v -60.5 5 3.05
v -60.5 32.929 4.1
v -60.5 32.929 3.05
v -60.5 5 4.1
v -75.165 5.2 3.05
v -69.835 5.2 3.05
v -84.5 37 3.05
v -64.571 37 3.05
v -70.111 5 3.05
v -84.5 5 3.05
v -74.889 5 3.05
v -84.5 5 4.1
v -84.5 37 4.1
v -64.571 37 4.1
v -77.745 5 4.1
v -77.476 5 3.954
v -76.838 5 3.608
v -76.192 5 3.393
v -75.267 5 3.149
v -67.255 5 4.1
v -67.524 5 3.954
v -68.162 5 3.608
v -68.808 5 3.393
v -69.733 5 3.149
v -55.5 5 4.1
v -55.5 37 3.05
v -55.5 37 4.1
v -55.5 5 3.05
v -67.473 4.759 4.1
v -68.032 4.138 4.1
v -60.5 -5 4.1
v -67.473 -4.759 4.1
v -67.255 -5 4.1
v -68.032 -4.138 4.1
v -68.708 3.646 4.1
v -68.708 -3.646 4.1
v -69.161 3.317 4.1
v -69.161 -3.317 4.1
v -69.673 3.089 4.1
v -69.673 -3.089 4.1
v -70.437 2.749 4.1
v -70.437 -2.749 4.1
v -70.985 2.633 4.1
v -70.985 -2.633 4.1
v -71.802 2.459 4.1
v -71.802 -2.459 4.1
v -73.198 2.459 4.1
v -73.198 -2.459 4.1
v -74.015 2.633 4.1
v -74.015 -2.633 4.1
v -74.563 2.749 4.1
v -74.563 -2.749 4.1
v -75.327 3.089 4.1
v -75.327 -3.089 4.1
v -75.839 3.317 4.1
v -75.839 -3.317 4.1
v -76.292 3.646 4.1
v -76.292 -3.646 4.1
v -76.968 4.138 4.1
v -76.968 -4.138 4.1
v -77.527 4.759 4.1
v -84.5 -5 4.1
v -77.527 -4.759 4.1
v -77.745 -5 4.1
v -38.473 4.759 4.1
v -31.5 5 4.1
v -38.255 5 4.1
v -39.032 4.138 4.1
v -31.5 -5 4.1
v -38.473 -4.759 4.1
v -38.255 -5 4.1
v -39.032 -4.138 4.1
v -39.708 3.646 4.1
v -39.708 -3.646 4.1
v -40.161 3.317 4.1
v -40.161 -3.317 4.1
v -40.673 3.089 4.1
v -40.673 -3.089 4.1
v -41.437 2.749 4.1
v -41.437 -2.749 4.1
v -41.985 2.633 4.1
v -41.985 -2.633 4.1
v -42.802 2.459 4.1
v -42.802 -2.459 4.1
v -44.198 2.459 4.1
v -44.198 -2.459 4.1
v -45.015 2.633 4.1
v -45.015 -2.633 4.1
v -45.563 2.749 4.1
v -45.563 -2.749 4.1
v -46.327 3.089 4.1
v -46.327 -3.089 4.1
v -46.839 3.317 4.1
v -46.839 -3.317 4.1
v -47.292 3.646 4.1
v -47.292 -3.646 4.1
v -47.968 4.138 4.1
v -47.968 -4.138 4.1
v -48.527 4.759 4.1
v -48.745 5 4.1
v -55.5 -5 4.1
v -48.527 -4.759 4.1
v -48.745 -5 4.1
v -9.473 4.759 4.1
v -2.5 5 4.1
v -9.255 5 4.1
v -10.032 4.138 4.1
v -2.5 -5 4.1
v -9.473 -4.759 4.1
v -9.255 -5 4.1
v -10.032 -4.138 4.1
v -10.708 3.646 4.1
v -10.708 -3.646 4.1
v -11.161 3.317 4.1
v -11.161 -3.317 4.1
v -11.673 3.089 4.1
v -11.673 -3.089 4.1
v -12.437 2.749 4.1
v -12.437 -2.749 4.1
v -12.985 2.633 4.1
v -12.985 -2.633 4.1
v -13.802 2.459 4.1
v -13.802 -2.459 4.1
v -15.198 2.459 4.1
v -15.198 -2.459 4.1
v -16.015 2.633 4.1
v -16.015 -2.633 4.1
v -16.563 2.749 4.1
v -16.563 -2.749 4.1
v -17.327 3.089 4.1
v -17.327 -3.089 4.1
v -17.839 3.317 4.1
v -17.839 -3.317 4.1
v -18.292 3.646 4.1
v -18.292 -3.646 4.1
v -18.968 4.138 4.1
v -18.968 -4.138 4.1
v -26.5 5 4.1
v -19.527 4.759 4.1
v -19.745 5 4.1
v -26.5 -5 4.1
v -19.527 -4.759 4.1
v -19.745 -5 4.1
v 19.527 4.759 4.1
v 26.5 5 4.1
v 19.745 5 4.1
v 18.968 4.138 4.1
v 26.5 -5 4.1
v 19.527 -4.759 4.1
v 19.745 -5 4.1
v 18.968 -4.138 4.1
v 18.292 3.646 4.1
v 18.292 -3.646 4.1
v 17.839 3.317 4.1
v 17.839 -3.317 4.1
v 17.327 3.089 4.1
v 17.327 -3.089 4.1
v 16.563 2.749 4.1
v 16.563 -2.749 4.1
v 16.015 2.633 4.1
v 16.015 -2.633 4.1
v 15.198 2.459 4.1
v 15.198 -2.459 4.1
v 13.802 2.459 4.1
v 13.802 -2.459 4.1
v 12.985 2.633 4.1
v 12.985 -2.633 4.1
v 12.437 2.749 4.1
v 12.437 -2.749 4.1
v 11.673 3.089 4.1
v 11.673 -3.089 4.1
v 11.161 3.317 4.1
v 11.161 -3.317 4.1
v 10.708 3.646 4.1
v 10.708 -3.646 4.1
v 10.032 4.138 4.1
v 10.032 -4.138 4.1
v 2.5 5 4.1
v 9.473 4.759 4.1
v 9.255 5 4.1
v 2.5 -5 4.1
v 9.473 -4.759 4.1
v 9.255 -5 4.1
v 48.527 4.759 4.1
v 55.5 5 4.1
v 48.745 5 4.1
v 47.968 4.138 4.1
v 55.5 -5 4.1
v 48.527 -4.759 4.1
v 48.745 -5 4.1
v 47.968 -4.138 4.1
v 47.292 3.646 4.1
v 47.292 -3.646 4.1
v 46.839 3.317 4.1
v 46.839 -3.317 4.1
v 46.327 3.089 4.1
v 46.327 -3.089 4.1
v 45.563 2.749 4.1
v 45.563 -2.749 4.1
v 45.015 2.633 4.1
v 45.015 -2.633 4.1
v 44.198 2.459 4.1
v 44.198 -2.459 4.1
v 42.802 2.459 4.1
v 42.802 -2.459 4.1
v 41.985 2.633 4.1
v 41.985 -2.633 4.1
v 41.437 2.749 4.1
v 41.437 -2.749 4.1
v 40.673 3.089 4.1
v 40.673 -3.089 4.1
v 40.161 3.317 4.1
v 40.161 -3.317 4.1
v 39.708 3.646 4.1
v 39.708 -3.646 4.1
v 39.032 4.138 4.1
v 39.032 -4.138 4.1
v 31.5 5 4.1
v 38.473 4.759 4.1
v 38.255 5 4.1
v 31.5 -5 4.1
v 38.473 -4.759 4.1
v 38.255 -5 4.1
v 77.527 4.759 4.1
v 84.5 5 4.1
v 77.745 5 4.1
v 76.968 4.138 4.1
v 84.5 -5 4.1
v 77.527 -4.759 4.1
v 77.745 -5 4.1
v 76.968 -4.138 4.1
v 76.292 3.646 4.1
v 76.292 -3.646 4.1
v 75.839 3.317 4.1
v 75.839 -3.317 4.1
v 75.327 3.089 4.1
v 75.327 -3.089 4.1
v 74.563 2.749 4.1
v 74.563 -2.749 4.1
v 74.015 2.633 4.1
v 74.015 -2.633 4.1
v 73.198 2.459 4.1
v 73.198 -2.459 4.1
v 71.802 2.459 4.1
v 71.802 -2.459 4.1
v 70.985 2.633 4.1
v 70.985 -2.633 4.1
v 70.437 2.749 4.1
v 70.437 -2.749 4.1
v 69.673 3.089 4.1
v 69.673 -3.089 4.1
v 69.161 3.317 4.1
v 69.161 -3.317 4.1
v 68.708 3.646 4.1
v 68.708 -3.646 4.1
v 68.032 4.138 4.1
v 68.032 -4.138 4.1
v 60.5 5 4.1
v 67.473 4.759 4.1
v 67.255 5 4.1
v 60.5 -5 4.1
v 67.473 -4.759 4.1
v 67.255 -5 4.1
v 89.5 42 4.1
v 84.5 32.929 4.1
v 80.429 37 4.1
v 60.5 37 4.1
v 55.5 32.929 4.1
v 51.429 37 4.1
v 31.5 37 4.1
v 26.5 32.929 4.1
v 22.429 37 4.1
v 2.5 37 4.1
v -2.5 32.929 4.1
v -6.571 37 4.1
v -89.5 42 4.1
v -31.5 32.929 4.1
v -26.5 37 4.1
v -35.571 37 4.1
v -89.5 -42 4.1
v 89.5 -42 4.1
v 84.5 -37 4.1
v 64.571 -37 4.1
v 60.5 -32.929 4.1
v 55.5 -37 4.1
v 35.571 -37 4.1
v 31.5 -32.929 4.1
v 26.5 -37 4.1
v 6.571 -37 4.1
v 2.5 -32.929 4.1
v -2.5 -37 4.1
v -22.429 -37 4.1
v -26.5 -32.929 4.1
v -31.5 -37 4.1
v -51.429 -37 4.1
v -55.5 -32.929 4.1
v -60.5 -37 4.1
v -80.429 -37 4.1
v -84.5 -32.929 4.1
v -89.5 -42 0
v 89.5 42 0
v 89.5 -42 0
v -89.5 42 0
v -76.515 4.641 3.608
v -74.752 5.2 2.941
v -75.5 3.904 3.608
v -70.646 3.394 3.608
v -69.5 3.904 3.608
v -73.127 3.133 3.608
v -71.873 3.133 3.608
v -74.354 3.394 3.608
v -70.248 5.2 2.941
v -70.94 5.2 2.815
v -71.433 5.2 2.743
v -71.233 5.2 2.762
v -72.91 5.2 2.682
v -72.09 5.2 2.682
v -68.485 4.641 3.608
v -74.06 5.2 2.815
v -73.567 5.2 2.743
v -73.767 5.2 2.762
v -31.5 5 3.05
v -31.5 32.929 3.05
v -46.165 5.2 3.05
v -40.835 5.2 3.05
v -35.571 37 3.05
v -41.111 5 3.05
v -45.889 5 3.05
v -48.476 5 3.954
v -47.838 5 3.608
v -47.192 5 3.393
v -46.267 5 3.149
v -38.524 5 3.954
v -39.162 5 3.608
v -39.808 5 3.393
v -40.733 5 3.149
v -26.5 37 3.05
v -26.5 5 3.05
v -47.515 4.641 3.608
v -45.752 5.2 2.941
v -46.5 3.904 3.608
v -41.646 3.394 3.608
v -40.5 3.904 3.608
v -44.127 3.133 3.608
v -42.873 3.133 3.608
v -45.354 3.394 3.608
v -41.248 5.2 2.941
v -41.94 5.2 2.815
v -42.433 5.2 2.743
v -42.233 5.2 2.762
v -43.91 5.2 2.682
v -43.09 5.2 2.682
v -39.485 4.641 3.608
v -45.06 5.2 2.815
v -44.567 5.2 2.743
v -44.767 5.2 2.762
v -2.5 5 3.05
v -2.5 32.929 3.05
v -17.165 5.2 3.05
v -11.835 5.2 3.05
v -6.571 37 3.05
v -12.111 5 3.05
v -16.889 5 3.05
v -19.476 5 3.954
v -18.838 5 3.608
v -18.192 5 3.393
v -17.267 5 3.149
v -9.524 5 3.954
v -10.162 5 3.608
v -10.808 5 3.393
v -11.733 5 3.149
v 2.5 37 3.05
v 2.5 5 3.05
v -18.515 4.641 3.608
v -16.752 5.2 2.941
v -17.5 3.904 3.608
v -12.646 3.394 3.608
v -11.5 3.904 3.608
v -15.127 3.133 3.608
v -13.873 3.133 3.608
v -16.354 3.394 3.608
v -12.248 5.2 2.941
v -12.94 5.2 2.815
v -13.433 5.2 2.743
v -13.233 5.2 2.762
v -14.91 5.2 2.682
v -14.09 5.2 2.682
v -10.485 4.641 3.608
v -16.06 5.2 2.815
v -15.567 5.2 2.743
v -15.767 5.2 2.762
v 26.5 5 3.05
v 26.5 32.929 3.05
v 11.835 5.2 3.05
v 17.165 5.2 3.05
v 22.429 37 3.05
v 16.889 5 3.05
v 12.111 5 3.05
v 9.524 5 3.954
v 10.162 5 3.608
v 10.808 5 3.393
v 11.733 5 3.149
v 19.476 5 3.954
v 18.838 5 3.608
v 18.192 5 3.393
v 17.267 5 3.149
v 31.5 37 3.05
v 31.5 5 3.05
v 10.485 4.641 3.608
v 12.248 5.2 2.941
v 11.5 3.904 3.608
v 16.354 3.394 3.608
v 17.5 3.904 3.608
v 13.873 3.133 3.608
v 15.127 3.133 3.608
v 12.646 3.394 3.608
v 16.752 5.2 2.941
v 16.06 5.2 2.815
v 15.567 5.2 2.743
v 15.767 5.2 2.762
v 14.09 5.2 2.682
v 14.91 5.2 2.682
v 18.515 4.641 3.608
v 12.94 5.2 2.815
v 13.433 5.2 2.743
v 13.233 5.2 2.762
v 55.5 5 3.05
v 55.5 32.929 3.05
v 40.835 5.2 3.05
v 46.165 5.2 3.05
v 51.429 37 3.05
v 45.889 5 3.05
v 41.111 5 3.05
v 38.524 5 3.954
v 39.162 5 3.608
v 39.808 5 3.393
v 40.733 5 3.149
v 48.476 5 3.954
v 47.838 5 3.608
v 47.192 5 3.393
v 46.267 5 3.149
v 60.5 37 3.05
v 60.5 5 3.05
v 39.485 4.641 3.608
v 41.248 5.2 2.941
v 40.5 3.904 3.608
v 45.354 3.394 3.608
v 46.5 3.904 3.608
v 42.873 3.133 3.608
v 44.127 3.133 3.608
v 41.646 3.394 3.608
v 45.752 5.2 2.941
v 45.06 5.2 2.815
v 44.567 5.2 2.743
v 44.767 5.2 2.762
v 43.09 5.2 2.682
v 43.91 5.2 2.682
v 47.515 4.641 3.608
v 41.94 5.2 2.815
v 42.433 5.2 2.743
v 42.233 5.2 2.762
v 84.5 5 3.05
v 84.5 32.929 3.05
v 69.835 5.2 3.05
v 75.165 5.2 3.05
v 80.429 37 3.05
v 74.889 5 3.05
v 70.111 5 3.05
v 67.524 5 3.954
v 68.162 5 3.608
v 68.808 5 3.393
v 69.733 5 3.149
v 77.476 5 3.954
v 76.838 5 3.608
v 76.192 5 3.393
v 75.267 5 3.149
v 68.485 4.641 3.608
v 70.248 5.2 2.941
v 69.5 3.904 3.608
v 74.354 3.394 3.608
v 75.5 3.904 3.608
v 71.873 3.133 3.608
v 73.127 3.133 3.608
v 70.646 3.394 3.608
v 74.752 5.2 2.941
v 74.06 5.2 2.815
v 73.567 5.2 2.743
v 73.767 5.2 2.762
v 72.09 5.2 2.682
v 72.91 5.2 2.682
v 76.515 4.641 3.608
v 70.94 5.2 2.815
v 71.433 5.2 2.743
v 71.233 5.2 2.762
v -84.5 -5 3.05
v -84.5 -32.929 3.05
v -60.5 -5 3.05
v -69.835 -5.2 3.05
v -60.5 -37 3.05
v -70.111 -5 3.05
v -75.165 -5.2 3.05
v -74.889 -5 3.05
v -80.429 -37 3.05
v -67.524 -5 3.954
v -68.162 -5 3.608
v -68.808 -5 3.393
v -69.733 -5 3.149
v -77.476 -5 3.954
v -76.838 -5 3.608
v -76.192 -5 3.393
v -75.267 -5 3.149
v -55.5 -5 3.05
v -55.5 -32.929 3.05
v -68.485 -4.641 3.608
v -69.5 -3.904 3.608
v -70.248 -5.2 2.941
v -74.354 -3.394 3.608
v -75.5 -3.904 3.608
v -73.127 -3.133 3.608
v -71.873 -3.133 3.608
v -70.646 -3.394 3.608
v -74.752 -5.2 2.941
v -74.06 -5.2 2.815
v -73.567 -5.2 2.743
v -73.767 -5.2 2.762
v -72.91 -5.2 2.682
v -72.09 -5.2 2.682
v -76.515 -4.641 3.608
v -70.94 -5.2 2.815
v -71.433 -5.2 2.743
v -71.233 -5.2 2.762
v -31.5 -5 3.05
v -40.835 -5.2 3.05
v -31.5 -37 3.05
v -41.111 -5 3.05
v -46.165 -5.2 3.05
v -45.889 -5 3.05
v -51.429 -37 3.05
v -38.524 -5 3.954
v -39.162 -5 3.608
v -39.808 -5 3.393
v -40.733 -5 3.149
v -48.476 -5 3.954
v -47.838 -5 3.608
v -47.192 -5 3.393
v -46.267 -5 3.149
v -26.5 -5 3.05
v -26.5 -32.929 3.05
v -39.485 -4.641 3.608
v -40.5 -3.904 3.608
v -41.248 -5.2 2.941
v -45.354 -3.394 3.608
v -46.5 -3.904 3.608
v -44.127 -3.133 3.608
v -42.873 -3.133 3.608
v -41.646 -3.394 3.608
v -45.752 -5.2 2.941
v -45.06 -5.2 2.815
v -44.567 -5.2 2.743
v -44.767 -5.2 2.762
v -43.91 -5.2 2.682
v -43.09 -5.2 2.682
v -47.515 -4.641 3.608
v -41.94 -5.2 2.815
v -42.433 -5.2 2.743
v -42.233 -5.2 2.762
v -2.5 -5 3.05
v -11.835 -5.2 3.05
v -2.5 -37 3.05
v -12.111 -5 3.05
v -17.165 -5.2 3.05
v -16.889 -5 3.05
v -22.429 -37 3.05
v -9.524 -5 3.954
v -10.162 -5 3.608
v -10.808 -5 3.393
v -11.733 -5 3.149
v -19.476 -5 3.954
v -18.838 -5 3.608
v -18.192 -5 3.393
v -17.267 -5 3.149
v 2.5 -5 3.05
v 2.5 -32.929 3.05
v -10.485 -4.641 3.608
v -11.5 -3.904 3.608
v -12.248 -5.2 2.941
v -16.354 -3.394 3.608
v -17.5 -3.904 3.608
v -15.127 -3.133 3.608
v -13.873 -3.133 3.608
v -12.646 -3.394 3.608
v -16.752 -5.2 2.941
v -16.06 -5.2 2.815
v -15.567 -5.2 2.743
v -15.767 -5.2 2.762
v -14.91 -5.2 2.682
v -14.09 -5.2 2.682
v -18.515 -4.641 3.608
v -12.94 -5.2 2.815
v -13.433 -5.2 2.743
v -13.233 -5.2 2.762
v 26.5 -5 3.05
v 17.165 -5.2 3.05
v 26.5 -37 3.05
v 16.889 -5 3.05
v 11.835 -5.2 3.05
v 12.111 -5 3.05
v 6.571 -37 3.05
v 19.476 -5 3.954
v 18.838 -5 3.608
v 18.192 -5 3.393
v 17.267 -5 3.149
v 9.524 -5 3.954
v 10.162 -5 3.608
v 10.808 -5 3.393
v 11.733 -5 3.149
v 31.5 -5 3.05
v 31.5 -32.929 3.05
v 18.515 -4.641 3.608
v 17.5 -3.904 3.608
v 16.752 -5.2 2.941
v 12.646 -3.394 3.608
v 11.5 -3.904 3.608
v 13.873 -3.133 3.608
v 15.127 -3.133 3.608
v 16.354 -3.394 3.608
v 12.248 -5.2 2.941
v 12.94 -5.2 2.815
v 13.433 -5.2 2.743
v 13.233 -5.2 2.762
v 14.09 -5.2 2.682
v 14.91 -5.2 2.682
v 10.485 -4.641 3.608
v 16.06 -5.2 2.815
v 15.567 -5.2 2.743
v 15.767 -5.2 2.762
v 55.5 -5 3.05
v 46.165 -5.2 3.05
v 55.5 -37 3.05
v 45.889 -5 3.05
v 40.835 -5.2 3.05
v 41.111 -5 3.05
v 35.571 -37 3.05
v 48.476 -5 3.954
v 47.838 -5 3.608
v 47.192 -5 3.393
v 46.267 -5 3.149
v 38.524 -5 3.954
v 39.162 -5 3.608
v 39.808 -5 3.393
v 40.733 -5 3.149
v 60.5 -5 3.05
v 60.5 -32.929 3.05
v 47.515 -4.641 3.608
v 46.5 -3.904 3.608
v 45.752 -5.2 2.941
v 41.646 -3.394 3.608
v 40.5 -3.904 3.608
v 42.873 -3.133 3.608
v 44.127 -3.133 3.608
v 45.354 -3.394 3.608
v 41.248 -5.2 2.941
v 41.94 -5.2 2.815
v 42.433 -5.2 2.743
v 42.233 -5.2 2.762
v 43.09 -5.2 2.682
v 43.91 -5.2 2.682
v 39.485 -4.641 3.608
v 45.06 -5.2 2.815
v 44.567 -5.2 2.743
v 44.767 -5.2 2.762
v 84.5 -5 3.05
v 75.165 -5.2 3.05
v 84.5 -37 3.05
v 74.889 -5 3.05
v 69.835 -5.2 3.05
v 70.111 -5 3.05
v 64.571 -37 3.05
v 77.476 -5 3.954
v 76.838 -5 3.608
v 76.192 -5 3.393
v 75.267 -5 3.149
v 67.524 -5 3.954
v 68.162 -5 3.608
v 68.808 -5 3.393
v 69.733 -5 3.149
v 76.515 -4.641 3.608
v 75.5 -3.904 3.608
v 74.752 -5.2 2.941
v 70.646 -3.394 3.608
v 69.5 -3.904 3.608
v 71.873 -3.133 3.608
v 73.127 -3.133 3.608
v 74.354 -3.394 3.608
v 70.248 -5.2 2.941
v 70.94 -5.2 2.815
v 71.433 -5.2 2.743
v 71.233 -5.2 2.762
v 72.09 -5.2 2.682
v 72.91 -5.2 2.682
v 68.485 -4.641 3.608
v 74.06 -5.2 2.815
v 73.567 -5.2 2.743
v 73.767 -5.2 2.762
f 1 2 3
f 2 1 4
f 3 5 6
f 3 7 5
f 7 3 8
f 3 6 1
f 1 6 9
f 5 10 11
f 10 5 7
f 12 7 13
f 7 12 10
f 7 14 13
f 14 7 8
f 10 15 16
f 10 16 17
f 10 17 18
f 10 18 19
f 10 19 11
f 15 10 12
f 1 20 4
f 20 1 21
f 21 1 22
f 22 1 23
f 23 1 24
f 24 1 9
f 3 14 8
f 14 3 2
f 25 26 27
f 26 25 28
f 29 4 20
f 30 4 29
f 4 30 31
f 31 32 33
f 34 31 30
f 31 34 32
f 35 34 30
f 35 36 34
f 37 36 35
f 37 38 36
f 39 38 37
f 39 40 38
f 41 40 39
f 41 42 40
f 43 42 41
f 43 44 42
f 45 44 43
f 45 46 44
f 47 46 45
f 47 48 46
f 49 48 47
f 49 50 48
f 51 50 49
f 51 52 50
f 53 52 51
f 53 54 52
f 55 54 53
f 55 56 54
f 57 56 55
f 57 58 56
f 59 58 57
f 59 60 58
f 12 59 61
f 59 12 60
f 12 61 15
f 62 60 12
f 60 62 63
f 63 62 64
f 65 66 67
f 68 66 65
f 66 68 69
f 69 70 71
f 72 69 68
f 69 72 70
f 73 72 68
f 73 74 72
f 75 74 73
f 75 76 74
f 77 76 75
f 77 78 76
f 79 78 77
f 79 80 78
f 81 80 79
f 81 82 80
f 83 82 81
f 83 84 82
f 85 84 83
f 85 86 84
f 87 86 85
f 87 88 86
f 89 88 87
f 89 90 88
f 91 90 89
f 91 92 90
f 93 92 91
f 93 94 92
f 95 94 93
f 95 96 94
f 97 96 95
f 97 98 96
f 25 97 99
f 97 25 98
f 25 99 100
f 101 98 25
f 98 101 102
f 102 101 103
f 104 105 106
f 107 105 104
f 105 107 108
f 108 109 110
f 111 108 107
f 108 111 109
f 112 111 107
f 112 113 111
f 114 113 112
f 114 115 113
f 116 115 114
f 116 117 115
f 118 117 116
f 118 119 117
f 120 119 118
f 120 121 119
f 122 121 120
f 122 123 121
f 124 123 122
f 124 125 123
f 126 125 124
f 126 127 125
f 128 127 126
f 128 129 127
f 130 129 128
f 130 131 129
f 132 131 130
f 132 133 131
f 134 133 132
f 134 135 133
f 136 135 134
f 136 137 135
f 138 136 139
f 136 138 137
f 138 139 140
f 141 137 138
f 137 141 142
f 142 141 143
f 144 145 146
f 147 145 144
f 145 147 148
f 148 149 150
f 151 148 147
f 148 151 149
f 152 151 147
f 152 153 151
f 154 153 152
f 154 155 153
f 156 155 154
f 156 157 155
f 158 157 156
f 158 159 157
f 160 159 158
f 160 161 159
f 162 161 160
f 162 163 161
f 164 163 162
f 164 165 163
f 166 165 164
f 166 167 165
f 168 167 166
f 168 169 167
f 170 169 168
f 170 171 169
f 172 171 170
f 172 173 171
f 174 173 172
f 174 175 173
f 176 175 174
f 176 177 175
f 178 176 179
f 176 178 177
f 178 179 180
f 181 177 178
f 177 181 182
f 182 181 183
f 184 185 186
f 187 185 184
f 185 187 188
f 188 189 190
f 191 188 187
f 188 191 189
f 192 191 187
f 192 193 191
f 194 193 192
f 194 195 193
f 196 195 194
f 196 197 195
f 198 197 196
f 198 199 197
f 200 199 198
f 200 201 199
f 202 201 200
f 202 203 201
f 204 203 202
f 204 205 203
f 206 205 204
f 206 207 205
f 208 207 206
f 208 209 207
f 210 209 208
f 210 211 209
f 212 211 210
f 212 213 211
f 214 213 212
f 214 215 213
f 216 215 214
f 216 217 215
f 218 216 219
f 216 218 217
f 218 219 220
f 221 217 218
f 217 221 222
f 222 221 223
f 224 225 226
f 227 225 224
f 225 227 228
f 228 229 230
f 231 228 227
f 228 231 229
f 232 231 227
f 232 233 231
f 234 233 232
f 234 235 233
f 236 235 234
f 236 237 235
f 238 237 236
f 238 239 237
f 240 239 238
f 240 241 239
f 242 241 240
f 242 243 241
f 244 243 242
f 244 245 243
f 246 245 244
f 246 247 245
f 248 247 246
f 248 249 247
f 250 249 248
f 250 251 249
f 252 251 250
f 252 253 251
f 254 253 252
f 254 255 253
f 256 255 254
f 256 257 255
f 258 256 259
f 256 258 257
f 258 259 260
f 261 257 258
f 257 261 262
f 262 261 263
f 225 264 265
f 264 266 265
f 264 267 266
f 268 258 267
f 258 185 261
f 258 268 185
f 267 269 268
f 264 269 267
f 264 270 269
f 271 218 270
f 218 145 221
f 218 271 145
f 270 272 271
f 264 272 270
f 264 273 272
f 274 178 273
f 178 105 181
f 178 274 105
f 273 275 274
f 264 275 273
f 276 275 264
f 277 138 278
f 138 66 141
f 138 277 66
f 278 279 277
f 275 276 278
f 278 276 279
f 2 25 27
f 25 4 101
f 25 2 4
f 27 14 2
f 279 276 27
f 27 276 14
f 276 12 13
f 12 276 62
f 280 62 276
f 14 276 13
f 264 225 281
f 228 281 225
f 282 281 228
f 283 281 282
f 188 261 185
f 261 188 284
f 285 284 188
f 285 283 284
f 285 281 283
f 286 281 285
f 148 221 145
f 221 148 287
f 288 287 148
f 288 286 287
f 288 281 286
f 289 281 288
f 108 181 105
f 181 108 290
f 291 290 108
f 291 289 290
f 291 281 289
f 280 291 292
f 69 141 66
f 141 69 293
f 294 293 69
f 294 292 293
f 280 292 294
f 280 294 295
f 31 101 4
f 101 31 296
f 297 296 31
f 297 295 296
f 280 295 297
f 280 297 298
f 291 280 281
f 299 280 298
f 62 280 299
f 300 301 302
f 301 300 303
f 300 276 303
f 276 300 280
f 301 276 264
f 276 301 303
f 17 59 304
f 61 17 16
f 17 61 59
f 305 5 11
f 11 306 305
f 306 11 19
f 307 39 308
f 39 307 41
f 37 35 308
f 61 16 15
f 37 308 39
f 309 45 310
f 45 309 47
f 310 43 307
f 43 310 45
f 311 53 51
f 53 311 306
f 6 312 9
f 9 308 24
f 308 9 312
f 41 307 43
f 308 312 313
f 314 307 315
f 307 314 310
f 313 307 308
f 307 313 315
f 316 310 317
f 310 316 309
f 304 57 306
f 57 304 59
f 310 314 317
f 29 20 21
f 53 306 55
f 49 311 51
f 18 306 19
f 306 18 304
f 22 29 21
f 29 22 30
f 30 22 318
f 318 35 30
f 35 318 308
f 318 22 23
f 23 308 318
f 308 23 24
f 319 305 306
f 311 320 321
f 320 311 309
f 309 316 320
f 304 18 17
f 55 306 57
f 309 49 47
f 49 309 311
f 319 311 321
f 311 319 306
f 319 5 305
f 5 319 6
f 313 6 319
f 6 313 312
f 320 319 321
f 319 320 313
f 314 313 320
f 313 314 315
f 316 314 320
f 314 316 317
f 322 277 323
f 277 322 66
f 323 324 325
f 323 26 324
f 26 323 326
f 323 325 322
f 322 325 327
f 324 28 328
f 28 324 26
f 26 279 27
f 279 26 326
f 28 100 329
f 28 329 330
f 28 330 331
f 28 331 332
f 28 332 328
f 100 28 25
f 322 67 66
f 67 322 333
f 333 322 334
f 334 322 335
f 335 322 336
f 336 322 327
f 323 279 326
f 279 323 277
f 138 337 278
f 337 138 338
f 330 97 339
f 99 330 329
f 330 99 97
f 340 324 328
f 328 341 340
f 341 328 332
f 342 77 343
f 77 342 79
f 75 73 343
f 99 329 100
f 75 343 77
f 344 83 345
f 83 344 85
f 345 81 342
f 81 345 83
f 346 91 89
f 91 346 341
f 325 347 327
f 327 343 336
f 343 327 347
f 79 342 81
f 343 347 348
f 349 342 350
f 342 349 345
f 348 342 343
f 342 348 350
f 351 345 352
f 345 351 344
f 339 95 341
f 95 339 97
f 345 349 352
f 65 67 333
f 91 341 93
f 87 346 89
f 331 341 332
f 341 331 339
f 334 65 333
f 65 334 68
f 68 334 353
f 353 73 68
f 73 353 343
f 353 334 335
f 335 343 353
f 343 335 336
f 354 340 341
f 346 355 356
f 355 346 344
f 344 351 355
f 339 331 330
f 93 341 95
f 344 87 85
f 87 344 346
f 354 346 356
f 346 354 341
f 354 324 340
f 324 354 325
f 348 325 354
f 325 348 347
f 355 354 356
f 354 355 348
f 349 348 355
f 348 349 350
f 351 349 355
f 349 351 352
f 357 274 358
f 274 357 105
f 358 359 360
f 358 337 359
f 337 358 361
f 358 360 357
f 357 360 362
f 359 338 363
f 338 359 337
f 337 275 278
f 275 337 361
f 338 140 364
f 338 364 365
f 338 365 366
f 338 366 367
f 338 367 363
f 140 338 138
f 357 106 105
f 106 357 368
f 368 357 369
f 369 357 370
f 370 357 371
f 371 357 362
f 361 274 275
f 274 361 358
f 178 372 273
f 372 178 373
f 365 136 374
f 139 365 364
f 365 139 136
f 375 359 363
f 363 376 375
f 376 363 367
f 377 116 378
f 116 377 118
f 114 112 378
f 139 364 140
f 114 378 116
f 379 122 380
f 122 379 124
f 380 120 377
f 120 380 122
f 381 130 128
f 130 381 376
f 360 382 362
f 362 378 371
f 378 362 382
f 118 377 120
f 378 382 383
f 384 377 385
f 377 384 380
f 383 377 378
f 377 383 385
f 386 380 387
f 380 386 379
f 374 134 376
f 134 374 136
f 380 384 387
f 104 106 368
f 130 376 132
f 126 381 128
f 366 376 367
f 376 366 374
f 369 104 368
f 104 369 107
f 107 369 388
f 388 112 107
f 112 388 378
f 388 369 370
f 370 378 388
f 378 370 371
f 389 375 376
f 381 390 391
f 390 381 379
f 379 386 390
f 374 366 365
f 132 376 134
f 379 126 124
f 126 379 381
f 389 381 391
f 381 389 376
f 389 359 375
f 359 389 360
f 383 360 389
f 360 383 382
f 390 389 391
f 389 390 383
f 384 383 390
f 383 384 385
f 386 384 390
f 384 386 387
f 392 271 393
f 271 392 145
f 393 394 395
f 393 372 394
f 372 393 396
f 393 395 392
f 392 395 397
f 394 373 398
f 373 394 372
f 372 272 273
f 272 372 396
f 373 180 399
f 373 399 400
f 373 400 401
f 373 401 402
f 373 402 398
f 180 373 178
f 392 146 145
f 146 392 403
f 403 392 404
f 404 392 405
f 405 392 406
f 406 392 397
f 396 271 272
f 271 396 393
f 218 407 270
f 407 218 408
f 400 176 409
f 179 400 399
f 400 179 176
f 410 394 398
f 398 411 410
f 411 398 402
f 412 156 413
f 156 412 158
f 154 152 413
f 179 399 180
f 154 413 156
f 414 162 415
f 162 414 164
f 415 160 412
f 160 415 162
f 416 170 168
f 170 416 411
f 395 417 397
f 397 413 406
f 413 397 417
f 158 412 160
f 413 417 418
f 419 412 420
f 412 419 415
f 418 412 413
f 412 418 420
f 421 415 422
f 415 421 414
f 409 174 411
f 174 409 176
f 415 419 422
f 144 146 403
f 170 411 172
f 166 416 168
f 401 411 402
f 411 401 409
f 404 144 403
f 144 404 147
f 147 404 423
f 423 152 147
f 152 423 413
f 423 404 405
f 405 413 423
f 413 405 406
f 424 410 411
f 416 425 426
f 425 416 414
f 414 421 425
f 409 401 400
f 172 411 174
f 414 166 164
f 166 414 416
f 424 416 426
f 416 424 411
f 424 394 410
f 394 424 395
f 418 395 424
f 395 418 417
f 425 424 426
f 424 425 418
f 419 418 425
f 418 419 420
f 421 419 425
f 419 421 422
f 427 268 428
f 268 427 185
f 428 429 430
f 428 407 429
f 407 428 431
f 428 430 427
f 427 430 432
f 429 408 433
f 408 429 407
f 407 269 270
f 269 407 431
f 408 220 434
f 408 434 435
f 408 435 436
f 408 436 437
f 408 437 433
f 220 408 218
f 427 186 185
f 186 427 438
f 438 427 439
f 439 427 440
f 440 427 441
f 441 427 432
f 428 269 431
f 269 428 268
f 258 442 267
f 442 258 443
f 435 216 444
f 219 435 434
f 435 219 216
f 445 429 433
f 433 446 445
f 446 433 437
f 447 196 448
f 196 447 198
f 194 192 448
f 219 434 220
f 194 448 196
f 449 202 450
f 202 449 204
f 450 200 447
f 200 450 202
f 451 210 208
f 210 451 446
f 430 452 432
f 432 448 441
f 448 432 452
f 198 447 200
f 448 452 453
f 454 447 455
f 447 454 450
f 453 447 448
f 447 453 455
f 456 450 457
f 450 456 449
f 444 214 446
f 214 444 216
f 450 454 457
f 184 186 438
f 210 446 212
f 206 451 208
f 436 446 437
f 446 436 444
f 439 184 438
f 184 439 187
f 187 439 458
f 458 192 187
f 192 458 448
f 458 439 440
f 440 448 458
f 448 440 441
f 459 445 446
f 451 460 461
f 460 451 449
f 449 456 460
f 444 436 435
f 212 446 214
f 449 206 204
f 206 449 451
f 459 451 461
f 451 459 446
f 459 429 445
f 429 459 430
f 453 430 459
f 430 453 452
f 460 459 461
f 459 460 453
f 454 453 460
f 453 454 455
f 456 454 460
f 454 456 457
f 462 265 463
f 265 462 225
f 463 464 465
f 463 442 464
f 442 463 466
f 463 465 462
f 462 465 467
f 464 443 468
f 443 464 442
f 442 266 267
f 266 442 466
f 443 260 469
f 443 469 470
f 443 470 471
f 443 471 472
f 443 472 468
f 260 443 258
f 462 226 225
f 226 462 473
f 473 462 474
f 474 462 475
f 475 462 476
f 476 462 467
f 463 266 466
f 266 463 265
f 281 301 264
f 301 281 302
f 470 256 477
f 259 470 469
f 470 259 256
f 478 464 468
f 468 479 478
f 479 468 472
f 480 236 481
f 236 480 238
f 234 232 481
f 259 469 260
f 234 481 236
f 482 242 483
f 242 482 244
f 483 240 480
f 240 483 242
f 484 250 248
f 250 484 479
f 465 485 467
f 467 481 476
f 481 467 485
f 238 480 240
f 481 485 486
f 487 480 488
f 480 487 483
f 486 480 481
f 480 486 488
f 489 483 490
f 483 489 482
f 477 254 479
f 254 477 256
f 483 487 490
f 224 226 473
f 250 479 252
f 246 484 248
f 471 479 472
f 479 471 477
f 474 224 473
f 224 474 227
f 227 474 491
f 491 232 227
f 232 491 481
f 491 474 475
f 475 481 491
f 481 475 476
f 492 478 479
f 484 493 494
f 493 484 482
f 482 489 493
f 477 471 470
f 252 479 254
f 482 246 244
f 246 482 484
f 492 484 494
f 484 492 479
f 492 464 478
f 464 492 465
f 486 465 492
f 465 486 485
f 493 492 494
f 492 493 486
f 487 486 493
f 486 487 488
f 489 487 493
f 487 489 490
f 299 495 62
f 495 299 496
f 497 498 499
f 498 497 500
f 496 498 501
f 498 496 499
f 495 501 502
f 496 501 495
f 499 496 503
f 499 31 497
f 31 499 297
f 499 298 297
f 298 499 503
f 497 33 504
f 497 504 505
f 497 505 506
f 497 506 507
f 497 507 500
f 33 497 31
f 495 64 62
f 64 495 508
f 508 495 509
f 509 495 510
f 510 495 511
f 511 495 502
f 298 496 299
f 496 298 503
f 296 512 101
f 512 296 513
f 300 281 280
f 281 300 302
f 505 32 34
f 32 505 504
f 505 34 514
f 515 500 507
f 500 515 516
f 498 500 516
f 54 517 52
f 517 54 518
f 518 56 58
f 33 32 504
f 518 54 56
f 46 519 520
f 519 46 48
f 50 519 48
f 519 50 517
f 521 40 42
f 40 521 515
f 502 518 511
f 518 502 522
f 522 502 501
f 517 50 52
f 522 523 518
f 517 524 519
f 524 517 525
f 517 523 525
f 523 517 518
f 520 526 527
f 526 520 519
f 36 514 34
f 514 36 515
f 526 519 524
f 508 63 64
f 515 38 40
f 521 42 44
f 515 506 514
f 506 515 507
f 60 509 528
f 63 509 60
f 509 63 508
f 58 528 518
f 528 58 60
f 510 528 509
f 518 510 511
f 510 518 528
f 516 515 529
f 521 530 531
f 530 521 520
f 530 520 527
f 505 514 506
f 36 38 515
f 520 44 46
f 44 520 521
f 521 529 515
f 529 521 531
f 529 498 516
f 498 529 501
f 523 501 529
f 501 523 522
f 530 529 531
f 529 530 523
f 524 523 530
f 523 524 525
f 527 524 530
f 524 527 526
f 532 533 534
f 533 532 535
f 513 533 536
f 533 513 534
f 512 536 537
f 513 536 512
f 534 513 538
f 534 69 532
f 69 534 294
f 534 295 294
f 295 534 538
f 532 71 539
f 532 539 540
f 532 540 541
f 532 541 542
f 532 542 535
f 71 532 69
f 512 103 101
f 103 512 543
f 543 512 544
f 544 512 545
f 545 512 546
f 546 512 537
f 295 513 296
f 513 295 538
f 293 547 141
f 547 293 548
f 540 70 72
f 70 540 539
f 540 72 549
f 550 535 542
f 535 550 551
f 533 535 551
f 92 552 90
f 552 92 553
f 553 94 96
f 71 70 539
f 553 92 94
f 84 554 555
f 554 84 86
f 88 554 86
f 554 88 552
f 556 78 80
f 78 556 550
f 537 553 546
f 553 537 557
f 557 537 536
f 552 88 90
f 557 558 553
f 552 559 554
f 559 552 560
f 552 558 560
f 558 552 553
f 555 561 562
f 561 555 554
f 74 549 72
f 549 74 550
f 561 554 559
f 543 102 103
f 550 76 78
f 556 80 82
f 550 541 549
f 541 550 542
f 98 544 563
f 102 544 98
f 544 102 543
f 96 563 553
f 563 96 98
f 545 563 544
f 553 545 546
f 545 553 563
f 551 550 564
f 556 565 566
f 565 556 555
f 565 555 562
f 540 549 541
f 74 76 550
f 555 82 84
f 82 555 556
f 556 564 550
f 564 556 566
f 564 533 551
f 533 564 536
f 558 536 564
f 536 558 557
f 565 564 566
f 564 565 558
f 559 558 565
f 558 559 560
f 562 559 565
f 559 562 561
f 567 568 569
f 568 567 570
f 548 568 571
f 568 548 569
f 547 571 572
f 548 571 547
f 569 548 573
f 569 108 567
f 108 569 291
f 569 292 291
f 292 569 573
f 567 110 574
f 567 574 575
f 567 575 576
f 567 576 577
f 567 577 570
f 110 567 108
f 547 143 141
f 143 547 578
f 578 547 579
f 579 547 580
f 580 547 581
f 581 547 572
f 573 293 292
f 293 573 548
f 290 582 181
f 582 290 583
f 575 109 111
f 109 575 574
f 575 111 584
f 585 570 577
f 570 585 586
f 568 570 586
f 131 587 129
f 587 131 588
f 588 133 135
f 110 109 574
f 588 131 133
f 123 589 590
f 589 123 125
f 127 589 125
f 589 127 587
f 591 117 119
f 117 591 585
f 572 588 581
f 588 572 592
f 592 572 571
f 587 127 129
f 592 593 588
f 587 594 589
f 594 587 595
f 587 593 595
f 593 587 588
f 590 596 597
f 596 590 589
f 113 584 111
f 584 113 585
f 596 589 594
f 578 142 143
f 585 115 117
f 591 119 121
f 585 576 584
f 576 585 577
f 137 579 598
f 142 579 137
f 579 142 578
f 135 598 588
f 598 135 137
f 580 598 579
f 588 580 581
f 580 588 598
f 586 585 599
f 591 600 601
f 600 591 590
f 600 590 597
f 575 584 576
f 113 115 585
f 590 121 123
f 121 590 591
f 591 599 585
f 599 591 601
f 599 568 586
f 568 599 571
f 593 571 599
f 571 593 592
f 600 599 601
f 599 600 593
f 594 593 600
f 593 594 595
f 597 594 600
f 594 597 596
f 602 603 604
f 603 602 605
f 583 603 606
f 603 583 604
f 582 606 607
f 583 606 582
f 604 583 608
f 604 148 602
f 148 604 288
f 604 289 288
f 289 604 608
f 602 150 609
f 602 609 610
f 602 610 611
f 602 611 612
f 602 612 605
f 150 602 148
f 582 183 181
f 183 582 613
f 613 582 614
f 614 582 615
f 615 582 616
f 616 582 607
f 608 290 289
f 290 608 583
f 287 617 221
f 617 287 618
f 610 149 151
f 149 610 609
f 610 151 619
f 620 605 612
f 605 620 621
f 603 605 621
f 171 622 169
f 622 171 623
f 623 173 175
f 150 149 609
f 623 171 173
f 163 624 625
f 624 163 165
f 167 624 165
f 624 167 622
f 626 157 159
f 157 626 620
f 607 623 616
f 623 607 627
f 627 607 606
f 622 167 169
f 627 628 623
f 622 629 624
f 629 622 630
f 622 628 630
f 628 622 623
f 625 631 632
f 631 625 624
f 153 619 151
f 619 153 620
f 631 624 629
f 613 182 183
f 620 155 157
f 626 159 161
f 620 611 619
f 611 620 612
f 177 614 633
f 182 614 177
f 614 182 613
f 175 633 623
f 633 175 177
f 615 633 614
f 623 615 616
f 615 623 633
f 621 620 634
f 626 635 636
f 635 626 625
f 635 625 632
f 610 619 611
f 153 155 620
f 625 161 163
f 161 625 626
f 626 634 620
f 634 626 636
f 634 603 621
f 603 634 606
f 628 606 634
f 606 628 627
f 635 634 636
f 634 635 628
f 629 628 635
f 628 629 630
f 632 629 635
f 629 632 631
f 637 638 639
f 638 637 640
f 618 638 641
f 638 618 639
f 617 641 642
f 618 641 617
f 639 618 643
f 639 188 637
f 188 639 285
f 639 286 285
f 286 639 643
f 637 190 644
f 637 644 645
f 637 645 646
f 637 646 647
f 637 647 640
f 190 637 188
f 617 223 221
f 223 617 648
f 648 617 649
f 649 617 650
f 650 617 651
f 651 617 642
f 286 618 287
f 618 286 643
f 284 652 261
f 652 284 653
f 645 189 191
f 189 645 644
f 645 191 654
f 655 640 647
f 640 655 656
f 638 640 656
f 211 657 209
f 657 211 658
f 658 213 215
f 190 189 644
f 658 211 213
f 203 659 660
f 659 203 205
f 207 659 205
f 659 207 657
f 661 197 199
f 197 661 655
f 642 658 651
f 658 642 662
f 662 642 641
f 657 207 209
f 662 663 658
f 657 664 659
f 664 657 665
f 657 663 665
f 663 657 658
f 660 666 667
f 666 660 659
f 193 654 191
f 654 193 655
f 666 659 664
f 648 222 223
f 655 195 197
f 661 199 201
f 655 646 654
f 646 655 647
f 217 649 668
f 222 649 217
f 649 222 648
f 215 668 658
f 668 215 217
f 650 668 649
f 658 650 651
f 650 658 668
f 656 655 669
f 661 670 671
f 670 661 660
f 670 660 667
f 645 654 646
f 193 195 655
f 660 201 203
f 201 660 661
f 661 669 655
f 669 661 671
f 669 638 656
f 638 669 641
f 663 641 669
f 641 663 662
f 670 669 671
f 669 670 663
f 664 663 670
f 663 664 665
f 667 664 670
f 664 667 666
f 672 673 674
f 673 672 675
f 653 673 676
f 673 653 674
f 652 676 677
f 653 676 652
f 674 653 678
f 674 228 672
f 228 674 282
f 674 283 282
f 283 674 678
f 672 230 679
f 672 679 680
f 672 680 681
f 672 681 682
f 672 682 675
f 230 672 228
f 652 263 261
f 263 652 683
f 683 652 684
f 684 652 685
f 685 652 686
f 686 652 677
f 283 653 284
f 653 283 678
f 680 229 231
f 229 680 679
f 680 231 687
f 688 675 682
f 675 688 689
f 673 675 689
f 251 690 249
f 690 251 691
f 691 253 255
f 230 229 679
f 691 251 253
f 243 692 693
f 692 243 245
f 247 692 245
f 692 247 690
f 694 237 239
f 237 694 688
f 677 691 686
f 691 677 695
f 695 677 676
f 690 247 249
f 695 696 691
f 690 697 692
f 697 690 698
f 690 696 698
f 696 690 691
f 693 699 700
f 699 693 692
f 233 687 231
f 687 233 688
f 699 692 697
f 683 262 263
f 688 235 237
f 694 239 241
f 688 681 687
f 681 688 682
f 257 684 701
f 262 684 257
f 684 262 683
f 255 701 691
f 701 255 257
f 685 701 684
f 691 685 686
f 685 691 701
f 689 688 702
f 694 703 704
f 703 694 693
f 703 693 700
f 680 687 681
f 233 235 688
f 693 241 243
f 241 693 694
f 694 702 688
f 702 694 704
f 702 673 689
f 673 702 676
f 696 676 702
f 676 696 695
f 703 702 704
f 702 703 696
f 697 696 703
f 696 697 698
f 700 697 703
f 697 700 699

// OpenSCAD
// How many columns of SD Card spots
columns = 6;

// How many rows of SD Card spots
rows = 2;


module case (cols=5, rows=2, zlevel=true) {
     width=24;			/* sdcard width */
     height=32;			/* sdcard height */
     depth=2.1;			/* sdcard depth */
     pocket_depth=depth+2;
     padding=5;
     thumb_radius=12;
     
     module sdcard() {
	  distance=sqrt((height/2)*(height/2) + (width/2)*(width/2)) - 3;
	  corner=sqrt(32) + 0.1;
	  scale([-1,1,1]) {
	       translate([-width/2, -height/2, -depth/2]) {
		    difference() {
			 cube([width, height, depth]);
			 translate([width, height, -0.2]) {
			 rotate([0, 0, 45]) {
			      translate([-corner/2, -corner/2, 0]) {
				   cube([corner, corner, depth + 0.4]);
			      }
			 }
			 }
		    }
	       }
	  }
     }
     
     module pocket(zlevel=true,center=true) {
	  module thumb(r=12) {
	       difference() {
		    translate([0,0,r+2]) {
			 sphere(r=r);
		    }
		    translate([-r, -3.9, 0]) {
			 cube([r*2,r*2,r*4]);
		    }
	       }
	  }

	  difference() {
	       translate([center ? 0 : width/2 + padding, center ? 0 : height/2 + padding, zlevel ? pocket_depth : pocket_depth/2]) {
		    difference() {
			 translate([0, 0, -pocket_depth/2])
			      cube([width + 2 * padding, height + 2 * padding, pocket_depth], center=true);
			 rotate([0, 180, 0])
			      sdcard();
		    }
	       }
	       translate([0, -thumb_radius+0.1, zlevel ? 0 : -pocket_depth/2 + 0.1]) {
		    thumb(thumb_radius);
	       }
	  }
     }

     translate([-cols/2*(width+padding)+(width+padding)/2, rows/2*(height+padding)-height/2, zlevel ? 0 : -pocket_depth/2]) {
	  for (s=[0:rows-1]) {
	       translate([0, -(height+2*padding)*s, 0]) {
		    for (x=[0:cols-1]) {
			 translate([x*(width+padding), 0, 0]) {
			      rotate([0, 0, s*180]) {
				   pocket();
			      }
			 }
		    }
	       }
	  }
     }
}

case(columns, rows);
